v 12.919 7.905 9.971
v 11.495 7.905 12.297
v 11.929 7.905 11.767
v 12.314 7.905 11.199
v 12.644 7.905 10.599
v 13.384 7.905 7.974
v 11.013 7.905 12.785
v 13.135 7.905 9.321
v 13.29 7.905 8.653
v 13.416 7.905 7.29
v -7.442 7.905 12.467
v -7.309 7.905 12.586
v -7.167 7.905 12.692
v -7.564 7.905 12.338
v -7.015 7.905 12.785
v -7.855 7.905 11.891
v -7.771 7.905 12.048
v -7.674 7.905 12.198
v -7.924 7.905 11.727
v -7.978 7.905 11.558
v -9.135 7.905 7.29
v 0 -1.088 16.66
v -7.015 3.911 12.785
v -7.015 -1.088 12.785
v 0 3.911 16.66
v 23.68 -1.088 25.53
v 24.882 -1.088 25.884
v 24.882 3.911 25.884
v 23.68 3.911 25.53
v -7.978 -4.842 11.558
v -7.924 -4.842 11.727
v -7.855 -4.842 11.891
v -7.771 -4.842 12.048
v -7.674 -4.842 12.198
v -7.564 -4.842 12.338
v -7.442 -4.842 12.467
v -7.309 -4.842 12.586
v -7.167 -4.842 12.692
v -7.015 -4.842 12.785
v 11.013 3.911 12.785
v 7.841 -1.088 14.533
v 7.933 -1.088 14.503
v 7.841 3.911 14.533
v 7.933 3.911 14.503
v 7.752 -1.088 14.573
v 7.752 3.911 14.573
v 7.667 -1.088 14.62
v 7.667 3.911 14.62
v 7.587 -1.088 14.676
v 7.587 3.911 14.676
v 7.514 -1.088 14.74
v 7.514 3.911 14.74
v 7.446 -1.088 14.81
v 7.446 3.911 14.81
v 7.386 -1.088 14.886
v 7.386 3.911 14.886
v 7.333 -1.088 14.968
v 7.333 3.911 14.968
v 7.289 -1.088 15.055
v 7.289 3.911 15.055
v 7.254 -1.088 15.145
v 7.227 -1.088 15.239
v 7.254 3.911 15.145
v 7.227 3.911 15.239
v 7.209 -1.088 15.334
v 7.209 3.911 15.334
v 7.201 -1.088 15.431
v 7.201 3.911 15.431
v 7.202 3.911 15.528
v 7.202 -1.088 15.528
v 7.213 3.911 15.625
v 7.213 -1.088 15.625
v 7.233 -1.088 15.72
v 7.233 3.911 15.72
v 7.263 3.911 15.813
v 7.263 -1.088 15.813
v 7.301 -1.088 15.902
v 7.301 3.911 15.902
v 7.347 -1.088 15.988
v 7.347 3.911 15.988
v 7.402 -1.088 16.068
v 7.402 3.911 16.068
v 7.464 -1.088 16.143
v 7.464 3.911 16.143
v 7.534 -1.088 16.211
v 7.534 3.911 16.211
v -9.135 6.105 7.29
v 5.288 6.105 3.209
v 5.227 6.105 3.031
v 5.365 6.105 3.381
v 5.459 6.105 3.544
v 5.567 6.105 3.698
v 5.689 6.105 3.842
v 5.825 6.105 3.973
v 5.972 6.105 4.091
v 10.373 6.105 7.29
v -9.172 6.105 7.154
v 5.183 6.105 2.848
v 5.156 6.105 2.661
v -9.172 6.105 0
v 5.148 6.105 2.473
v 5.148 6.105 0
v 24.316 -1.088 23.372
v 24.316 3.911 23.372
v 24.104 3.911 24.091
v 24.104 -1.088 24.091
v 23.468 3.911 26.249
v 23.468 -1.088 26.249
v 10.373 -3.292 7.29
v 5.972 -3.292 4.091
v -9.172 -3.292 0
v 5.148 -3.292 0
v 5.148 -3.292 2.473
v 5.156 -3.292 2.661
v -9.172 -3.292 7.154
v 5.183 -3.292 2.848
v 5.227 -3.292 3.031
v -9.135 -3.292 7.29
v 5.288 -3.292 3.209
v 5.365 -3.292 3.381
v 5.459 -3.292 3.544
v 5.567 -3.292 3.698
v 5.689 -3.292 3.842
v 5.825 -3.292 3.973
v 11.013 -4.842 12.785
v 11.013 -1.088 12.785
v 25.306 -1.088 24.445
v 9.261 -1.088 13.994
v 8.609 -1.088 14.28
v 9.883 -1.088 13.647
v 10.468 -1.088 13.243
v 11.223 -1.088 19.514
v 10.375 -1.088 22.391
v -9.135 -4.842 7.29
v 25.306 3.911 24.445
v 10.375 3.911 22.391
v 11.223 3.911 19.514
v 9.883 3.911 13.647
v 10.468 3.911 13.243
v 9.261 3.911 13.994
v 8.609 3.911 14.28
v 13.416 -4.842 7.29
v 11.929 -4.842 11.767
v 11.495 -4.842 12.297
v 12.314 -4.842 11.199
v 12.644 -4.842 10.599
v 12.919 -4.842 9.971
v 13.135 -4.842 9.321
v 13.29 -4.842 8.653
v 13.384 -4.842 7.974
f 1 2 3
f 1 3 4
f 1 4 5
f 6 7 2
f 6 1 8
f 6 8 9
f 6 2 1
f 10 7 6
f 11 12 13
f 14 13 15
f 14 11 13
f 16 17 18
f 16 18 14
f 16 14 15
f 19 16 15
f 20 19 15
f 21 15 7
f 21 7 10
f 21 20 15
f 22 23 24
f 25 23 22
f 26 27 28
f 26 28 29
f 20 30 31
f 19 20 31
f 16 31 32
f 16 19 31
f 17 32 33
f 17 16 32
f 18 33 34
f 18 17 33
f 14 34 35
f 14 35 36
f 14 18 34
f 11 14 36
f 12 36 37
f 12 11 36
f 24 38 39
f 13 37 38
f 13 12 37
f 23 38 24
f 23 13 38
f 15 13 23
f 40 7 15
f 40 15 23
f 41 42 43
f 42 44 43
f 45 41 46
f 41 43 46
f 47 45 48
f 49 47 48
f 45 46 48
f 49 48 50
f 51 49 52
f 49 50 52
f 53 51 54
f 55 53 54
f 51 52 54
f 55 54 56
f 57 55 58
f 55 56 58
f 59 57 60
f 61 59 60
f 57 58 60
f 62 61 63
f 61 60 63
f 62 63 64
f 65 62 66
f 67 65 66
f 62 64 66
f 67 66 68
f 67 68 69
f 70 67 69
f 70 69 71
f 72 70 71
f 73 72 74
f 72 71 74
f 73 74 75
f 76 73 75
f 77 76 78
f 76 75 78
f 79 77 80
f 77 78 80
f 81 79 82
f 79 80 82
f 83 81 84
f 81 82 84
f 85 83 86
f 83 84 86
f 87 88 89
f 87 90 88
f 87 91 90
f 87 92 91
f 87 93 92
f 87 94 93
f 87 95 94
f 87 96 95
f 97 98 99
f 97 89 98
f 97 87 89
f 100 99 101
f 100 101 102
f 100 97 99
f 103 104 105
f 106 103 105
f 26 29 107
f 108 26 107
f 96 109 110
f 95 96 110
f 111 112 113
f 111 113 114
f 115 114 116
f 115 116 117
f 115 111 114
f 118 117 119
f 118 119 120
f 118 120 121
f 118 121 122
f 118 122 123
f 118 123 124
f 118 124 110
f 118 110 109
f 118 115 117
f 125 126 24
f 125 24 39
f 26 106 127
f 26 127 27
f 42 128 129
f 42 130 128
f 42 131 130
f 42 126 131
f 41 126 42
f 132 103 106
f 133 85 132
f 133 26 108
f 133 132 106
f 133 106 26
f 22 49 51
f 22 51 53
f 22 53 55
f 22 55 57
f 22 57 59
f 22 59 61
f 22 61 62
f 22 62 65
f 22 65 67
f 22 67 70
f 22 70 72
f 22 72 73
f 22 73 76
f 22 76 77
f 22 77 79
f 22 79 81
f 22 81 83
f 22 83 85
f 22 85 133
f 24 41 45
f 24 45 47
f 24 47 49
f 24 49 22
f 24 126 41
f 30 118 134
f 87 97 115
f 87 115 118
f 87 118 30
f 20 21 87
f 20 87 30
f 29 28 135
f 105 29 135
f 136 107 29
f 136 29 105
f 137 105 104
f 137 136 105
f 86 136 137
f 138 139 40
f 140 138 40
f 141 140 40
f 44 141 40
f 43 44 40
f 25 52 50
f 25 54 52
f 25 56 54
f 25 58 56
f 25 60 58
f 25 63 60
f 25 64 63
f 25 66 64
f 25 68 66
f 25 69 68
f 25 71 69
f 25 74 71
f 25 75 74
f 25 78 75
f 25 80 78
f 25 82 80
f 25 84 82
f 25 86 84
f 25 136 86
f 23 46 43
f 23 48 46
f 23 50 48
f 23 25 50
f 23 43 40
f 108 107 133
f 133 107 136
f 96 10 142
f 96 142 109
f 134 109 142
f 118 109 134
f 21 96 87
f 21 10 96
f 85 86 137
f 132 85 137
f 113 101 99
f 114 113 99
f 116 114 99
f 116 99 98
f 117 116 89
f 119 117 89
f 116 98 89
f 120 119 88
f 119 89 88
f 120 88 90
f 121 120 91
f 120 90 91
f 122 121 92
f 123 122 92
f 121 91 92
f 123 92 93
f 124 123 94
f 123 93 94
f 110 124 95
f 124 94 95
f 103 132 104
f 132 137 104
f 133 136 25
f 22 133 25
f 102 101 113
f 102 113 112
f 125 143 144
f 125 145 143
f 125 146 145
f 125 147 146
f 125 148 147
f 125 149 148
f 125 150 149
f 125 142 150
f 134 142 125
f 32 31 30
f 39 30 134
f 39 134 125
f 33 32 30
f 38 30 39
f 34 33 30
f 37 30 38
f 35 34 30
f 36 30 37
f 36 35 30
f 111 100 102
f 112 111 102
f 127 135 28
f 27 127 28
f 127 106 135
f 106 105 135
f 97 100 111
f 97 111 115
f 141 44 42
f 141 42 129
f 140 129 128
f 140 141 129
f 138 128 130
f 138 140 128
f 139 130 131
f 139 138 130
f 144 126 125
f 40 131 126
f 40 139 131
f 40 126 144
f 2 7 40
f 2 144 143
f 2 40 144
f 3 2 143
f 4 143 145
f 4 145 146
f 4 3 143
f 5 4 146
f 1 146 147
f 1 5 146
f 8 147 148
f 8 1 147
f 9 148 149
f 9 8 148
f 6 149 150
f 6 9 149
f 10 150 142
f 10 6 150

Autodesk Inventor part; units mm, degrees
ref_plane "YZ Plane" through (0, 0, 0) normal (1, 0, 0) x (0, 1, 0)
ref_plane "XZ Plane" through (0, 0, 0) normal (0, 1, 0) x (-1, 0, 0)
ref_plane "XY Plane" through (0, 0, 0) normal (0, 0, 1) x (1, 0, 0)
sketch "Эскиз1" plane through (0, 0, 0) normal (0, 0, 1) x (1, 0, 0)
  line L0 (33.5, -8.5) -> (33.5, 11.5) projected
  line L1 (28.5, 11.5) -> (-21.5, 11.5)
  line L2 (-21.5, 11.5) -> (-21.5, -8.5)
  line L3 (-21.5, -8.5) -> (28.5, -8.5)
  line L4 (28.5, -8.5) -> (28.5, 11.5)
  point P0 (0, 0)
  point P1 (28.5, 1.5)
  point P2 (33.5, 1.5)
  dimension "d0" = 20
  dimension "d1" = 50
  dimension "d2" = 5
extrude "Выдавливание1" add sketch "Эскиз1" along normal blind 35
sketch "Эскиз2" plane through (-21.5, 11.5, 0) normal (0, 1, 0) x (1, 0, 0)
  line L0 (34.9155, -7.2898) -> (19.9439, -7.2898)
  arc A0 (29.433, -14.5026) -> (34.9155, -7.2898) centre (27.4297, -7.2898) ccw
  line L1 (29.0336, -16.2113) -> (32.723, -19.5135)
  line L2 (32.723, -19.5135) -> (45.8164, -23.3718)
  line L3 (45.8164, -23.3718) -> (45.6044, -24.0912)
  line L4 (45.6044, -24.0912) -> (46.806, -24.4452)
  line L5 (46.806, -24.4452) -> (46.382, -25.8841)
  line L6 (46.382, -25.8841) -> (45.1805, -25.53)
  line L7 (45.1805, -25.53) -> (44.9685, -26.2494)
  line L8 (44.9685, -26.2494) -> (31.875, -22.3912)
  line L9 (31.875, -22.3912) -> (21.5, -16.6598)
  line L10 (21.5, -16.6598) -> (19.9439, -14.1649)
  line L11 (19.9439, -14.1649) -> (19.9439, -7.2898)
  line L12 (31.8727, -7.2898) -> (27.4716, -4.0907)
  line L13 (26.6475, -2.4729) -> (26.6475, 0)
  line L14 (0, 0) -> (50, 0) projected
  line L15 (12.3278, 0) -> (12.3278, -7.1542)
  line L16 (12.3278, -7.1542) -> (13.5221, -11.5576)
  line L17 (14.4853, -12.7847) -> (21.5, -16.6598)
  arc A1 (29.433, -14.5026) -> (29.0336, -16.2113) centre (29.7006, -15.4662) ccw
  arc A2 (13.5221, -11.5576) -> (14.4853, -12.7847) centre (15.4524, -11.0341) ccw
  arc A3 (26.6475, -2.4729) -> (27.4716, -4.0907) centre (28.6475, -2.4729) ccw
  point P0 (21.5, 0)
  point P1 (27.4297, -14.7757)
  point P2 (13.7439, -12.3751)
  dimension "d5" = 1
  dimension "d6" = 2
  dimension "d7" = 0.75
  dimension "d8" = 3
  dimension "d9" = 1.5
extrude "Выдавливание2" cut sketch "Эскиз2" against normal through all keep common part
sketch "Эскиз3" plane through (-9.1722, 11.5, 0) normal (-1, 0, 0) x (0, 0, 1)
  line L0 (26.2494, 0) -> (26.2494, -20) projected
  line L1 (12.7847, 0) -> (12.7847, -20) projected
  line L2 (26.2494, -7.5889) -> (12.7847, -7.5889)
  line L3 (12.7847, -7.5889) -> (12.7847, -12.5875)
  line L4 (12.7847, -12.5875) -> (26.2494, -12.5875)
  line L5 (26.2494, -12.5875) -> (26.2494, -7.5889)
  line L6 (7.2898, 0) -> (7.2898, -20) projected
  line L7 (12.7847, -3.5953) -> (7.2898, -3.5953)
  line L8 (7.2898, -3.5953) -> (7.2898, -16.3417)
  line L9 (7.2898, -16.3417) -> (12.7847, -16.3417)
  line L10 (12.7847, -16.3417) -> (12.7847, -3.5953)
  line L11 (0, -20) -> (0, 0) projected
  line L12 (7.2898, -5.3948) -> (0, -5.3948)
  line L13 (0, -5.3948) -> (0, -14.7921)
  line L14 (0, -14.7921) -> (7.2898, -14.7921)
  line L15 (7.2898, -14.7921) -> (7.2898, -5.3948)
  point P0 (0, -11.5)
  point P1 (12.7847, -7.5889)
  point P2 (7.2898, -3.5953)
  point P3 (7.2898, -5.3948)
  point P4 (0, -5.3948)
extrude "Выдавливание3" cut sketch "Эскиз3" against normal blind 35 keep common part
